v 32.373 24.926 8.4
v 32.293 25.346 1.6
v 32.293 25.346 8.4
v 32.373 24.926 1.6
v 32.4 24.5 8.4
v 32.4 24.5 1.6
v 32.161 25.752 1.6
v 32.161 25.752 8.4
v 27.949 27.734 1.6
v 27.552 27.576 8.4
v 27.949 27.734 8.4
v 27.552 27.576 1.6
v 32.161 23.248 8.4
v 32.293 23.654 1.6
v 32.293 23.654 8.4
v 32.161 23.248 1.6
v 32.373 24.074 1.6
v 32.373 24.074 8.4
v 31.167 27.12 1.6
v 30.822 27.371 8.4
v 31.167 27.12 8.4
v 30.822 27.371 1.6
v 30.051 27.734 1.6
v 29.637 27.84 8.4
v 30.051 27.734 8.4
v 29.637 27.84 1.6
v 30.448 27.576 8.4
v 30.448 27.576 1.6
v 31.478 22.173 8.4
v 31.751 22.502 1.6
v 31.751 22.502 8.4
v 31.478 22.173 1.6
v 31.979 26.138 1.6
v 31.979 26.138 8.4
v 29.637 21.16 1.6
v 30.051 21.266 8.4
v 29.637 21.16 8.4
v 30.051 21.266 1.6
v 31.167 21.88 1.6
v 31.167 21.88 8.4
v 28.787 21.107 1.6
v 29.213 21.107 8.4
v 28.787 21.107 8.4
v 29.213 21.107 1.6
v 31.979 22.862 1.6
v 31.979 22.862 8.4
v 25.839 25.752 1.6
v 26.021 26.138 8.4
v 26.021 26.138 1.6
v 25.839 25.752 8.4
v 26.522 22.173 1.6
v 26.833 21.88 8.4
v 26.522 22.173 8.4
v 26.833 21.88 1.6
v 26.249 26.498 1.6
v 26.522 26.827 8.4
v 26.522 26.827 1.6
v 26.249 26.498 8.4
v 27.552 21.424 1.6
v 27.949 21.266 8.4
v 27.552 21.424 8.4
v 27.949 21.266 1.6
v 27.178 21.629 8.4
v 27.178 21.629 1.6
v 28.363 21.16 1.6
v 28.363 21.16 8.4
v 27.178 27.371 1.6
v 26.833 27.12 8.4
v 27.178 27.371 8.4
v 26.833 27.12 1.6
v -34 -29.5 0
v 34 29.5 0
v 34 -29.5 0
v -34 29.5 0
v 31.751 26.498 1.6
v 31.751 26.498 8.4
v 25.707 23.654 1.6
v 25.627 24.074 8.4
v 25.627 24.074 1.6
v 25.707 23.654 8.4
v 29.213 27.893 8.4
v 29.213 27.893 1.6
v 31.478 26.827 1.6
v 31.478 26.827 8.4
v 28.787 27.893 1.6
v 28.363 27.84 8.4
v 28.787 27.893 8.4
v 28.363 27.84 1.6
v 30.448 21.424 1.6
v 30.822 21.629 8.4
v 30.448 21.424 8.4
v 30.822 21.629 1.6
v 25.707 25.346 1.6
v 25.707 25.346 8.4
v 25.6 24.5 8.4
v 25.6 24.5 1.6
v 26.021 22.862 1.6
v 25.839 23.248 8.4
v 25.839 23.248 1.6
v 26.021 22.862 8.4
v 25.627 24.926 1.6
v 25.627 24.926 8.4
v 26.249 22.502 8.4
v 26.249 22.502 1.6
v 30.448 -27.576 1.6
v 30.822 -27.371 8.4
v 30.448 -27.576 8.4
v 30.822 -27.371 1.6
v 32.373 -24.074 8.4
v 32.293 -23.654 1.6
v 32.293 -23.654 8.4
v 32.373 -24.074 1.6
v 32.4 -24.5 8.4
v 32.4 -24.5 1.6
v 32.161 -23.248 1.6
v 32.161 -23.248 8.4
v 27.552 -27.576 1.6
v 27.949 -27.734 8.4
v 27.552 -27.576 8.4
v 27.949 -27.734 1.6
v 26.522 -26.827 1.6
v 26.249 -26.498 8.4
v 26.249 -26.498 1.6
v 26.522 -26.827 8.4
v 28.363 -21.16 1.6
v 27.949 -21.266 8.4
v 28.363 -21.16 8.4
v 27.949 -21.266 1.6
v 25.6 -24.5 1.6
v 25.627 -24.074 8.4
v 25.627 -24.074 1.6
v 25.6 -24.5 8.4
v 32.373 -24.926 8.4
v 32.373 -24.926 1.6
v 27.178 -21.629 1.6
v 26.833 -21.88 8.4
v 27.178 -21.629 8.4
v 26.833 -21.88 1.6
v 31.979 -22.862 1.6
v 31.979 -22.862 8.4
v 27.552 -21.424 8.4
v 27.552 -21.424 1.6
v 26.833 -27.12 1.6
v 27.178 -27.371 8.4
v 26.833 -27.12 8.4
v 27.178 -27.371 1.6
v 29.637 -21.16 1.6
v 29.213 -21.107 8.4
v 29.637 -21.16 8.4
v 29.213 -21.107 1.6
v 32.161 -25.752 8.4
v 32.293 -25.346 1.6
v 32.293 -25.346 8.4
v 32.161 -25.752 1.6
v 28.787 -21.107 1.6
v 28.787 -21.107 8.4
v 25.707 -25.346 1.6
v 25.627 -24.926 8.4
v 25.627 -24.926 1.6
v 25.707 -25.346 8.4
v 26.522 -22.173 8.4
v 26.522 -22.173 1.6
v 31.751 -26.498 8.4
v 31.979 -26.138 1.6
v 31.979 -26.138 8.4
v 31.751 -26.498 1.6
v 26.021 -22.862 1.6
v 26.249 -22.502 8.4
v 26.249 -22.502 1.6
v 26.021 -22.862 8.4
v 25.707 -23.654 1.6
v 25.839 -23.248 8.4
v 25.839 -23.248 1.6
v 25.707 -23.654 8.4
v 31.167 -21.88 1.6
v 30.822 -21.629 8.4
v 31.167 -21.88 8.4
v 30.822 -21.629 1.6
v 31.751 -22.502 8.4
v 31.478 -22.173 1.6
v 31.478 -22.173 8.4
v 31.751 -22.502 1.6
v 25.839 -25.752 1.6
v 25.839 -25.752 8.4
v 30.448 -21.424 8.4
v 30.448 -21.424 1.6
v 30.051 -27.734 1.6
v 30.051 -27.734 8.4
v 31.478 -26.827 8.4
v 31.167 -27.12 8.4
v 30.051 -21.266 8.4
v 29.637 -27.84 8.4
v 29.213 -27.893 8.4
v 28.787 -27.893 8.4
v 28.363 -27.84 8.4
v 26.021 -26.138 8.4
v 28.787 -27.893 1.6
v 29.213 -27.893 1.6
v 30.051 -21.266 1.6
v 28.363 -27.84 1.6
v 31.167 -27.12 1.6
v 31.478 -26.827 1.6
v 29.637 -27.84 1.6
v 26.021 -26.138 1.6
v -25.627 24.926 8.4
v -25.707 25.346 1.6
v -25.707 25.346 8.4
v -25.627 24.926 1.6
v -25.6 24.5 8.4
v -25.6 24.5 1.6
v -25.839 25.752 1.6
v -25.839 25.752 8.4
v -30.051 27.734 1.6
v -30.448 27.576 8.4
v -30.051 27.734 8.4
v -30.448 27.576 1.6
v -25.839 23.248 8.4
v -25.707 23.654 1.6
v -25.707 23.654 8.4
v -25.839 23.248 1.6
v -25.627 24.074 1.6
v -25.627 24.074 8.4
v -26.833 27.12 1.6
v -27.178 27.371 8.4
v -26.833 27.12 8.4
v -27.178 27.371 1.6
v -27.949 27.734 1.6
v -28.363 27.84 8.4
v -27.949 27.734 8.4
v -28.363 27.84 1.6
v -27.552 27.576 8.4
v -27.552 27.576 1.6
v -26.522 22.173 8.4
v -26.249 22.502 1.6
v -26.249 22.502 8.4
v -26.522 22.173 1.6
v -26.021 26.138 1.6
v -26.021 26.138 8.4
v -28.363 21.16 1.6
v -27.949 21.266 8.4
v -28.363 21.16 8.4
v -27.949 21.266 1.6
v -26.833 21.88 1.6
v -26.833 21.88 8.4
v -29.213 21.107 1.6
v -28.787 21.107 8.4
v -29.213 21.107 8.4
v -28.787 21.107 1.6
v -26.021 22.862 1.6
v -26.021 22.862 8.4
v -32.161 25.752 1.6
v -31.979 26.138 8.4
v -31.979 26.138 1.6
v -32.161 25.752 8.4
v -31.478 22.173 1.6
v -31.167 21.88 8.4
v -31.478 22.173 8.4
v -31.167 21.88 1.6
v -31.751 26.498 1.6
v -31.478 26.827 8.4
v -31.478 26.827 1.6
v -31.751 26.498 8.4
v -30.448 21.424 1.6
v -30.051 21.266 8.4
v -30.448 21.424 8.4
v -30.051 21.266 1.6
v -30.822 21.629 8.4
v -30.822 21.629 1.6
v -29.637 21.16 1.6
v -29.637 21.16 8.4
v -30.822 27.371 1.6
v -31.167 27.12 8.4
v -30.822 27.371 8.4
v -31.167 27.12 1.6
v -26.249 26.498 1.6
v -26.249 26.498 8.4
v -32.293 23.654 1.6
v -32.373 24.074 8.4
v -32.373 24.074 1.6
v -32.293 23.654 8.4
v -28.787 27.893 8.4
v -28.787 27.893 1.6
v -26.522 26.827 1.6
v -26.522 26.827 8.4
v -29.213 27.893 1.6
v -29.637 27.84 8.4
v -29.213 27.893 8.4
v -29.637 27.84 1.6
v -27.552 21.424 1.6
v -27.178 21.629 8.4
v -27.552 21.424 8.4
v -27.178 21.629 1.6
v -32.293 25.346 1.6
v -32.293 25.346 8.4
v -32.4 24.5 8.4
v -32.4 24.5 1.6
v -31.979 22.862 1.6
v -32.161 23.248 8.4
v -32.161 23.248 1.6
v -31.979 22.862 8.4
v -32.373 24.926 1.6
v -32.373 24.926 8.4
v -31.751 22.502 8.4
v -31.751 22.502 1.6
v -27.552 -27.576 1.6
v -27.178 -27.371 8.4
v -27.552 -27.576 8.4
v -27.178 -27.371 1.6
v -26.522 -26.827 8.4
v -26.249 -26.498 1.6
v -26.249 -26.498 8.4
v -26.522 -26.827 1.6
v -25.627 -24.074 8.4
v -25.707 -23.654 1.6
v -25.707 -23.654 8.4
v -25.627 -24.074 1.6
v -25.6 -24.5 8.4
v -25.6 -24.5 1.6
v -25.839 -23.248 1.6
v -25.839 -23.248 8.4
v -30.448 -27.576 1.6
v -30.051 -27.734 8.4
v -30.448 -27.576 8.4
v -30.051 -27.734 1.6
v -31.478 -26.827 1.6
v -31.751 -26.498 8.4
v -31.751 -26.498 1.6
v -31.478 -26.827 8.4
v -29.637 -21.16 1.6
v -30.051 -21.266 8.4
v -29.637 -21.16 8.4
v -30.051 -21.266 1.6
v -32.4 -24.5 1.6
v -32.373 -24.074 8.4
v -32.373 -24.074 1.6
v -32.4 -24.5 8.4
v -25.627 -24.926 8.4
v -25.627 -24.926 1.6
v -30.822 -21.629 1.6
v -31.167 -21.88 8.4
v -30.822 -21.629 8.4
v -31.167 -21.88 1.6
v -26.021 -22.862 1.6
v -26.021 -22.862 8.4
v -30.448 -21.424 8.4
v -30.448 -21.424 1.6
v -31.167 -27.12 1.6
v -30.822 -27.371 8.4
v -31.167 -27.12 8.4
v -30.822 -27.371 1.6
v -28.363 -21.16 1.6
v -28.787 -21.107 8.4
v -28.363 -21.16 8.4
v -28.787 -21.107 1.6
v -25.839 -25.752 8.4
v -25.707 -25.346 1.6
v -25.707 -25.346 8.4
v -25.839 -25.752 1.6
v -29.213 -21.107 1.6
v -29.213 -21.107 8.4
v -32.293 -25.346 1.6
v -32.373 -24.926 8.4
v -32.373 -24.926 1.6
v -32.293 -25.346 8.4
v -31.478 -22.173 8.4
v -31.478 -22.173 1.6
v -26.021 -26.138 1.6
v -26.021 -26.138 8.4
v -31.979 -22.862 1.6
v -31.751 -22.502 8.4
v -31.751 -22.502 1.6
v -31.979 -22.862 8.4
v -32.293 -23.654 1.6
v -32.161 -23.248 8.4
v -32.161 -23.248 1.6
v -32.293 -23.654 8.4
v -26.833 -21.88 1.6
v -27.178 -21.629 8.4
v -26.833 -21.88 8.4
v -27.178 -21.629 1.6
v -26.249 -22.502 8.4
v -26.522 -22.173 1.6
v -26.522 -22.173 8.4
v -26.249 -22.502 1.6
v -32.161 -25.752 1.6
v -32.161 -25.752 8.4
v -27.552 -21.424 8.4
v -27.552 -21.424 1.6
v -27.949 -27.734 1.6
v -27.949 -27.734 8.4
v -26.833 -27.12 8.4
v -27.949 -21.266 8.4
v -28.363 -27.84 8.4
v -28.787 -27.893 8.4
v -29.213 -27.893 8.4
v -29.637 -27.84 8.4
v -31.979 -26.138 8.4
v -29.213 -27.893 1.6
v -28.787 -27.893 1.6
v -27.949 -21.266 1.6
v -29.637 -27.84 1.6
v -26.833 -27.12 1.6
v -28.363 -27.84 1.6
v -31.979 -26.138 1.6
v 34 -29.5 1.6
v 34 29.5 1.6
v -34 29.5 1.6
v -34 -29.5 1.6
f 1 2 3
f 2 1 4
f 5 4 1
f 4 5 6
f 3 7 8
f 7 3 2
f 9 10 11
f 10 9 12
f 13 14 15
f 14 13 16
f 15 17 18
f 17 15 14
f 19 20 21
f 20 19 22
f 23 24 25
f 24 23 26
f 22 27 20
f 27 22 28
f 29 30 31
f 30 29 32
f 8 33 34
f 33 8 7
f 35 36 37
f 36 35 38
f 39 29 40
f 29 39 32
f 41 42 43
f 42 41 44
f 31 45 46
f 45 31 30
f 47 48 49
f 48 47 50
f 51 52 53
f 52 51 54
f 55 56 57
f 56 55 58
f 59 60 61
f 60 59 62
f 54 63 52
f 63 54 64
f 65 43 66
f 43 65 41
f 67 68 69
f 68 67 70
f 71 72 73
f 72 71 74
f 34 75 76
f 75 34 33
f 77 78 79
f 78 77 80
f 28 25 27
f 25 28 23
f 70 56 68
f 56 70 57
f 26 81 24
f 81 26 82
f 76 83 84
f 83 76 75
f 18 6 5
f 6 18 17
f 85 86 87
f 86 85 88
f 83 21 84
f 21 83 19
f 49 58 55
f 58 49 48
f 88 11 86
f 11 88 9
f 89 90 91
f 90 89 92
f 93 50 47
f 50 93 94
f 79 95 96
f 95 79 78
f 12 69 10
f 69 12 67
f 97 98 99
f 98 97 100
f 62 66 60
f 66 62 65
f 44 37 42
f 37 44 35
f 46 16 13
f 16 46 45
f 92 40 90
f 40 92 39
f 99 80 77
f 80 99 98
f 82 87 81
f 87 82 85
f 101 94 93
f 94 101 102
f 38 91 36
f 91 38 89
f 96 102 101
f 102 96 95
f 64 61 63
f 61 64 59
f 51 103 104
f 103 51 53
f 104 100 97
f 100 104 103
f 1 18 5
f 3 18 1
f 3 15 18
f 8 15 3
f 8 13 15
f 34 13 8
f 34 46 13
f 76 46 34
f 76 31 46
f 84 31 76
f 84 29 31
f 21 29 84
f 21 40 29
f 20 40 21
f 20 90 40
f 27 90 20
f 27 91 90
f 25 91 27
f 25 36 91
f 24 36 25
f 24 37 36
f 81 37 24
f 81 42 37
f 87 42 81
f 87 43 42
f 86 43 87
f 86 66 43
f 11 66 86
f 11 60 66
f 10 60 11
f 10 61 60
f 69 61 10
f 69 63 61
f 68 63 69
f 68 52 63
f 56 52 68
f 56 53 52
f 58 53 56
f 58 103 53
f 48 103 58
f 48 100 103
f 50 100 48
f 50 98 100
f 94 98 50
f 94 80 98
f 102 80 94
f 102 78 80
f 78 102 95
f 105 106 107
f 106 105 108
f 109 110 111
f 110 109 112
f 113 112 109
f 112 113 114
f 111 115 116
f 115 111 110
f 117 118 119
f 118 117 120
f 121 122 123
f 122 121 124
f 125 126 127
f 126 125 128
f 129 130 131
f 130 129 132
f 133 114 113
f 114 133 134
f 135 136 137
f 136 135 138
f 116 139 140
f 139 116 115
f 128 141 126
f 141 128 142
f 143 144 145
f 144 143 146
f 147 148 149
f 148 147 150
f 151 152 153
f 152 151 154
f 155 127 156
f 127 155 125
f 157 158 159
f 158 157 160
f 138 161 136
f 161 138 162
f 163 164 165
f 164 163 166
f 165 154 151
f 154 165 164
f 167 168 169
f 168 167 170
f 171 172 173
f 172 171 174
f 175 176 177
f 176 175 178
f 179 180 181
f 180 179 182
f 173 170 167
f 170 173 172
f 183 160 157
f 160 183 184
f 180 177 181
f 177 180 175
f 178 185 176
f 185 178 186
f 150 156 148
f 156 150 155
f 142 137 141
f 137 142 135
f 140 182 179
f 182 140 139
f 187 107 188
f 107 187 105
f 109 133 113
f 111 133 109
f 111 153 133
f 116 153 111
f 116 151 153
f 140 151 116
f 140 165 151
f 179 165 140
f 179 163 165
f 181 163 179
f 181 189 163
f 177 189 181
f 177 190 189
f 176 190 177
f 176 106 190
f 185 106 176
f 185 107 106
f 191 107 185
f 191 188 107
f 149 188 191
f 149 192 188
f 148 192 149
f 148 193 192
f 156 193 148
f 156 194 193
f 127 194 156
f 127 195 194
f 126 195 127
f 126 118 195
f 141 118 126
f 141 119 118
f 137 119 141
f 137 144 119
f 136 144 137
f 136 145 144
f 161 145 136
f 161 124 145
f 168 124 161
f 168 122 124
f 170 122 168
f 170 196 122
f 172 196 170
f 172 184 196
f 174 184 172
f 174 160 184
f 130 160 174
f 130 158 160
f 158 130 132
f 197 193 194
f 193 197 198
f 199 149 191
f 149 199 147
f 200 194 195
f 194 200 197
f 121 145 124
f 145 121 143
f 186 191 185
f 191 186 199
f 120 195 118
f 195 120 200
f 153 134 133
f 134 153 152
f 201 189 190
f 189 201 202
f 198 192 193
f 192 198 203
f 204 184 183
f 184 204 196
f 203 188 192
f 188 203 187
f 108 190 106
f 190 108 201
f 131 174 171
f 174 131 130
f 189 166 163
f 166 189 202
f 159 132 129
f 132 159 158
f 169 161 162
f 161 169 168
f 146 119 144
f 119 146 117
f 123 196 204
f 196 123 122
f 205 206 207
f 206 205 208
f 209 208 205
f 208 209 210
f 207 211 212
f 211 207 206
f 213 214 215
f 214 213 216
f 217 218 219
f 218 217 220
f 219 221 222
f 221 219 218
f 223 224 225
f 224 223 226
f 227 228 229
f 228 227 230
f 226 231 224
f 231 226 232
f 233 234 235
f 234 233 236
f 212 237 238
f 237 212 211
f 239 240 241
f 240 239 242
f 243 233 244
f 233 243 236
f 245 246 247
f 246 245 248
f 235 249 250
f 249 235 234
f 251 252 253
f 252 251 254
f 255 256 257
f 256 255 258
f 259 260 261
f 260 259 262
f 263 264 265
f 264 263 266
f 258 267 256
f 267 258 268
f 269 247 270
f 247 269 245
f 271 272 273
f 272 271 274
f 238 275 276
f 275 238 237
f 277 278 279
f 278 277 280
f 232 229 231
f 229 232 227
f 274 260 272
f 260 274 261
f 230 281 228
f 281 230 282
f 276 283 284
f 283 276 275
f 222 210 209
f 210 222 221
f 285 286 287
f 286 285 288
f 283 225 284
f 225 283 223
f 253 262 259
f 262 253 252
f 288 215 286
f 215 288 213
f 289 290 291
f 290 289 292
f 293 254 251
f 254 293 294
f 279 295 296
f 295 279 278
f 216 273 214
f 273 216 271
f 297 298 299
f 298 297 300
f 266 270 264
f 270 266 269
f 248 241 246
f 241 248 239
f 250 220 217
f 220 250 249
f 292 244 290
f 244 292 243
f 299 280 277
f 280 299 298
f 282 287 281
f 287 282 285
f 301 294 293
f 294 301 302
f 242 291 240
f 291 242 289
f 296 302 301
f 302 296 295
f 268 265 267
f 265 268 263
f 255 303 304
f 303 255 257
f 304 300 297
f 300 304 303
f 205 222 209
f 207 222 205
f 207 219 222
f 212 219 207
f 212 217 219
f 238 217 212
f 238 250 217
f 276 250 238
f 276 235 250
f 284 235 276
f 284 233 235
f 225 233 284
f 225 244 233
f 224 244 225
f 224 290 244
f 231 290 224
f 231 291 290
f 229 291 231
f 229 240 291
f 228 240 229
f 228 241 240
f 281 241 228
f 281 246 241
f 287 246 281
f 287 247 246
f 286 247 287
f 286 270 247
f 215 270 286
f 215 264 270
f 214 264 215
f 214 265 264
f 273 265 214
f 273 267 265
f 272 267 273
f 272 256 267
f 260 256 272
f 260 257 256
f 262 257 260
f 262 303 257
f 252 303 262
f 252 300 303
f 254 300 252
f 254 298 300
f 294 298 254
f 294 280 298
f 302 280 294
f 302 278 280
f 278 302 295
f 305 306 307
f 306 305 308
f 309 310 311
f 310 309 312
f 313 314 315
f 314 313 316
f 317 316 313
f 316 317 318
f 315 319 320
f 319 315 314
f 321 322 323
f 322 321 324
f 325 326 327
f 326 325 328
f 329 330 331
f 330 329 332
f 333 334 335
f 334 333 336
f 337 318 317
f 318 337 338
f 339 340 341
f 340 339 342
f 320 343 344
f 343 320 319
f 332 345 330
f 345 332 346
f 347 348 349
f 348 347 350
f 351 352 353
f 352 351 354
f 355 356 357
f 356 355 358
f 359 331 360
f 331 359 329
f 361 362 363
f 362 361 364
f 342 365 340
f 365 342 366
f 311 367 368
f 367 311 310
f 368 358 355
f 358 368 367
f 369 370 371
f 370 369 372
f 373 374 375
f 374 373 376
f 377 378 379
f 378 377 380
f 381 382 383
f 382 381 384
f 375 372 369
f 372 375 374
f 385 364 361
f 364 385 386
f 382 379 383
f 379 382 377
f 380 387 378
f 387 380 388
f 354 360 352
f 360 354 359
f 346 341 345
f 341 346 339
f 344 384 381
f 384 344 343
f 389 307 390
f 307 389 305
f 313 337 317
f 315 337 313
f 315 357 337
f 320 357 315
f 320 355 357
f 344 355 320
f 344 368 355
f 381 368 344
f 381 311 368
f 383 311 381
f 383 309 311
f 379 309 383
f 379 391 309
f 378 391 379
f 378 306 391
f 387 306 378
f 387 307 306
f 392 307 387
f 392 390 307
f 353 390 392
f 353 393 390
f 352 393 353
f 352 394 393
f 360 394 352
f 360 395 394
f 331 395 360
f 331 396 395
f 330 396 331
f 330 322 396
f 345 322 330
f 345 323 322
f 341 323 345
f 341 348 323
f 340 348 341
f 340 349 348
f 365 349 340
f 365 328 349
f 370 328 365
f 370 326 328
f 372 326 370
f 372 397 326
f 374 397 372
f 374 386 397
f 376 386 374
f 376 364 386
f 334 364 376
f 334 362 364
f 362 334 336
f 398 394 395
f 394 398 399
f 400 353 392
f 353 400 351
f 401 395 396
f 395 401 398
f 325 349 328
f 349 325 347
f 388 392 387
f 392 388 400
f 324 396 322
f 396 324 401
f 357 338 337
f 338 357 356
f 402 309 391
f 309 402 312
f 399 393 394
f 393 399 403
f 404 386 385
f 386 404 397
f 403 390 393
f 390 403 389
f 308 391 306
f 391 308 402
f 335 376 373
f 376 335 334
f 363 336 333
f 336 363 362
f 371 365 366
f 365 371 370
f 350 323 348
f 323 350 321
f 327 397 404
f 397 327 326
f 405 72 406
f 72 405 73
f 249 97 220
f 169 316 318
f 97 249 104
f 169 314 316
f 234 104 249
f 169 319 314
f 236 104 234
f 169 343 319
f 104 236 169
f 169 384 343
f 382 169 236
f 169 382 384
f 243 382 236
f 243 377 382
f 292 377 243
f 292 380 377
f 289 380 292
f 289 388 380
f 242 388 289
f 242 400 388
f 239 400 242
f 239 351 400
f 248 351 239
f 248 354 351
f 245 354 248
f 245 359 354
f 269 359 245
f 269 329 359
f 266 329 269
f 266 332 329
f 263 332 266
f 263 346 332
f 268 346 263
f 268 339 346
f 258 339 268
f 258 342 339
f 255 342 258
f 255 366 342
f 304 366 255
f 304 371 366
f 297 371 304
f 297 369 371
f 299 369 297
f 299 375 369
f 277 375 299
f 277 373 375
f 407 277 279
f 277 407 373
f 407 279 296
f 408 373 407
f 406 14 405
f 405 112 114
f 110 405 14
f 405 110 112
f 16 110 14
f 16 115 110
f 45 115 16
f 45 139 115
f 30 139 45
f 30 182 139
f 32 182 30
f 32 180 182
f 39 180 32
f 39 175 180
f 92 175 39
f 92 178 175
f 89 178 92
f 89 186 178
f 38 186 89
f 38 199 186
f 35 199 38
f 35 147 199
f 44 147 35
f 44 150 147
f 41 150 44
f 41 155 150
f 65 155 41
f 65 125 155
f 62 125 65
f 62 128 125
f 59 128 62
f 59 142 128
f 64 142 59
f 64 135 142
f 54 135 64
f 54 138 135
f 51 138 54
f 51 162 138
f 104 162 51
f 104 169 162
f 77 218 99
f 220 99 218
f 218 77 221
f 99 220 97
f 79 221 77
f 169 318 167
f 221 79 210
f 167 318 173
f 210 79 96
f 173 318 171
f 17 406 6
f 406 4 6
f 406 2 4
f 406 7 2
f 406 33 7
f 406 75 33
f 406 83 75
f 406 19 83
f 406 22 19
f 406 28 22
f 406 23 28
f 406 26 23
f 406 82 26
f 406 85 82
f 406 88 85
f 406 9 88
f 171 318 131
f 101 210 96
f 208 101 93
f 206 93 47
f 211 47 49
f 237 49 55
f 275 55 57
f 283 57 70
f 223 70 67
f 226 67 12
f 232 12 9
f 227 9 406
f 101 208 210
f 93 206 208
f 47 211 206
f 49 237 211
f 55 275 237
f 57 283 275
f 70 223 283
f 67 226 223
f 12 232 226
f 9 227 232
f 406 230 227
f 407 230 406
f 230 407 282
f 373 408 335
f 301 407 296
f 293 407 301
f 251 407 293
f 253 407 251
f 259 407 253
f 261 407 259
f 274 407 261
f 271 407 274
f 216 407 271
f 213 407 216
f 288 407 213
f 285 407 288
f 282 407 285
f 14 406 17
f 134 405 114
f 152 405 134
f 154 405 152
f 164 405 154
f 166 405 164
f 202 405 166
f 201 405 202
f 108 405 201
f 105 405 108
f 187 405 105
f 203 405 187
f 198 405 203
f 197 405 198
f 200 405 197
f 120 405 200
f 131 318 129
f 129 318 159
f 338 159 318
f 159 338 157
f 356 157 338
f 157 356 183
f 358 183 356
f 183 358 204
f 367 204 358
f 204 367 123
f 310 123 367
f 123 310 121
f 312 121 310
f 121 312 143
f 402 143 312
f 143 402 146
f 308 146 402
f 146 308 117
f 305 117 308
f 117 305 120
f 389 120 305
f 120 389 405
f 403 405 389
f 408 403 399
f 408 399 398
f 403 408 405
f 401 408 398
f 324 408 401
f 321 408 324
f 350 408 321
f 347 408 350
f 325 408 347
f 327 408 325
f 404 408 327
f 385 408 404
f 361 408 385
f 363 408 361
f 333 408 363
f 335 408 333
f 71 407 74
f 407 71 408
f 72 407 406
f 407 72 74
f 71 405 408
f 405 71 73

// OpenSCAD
// file: configuration/general.scad
//Screw standards
SCREW_STANDARD_M3=3;

//HDMI screen cover
HDMI_HOLES_LENGTH=157;
HDMI_HOLES_WIDTH=108;
GAP_MAINSCREWS_HDMI=3;
BASE_OUTERPAD_HDMI=2;
FRONT_COVER_TRAPS_TOLERANCE=0.1;


//Back plate
BACK_PLATE_CENTER_BLOB=6;
BACK_PLATE_WALL=3;
BACK_PLATE_THICKNESS=10;
SCREW_BLOCK_SIZE=12;

BACK_PLATE_ADAPTER0_THICKNESS=1;
BACK_PLATE_ADAPTER0_SPACING=100;
BACK_PLATE_SENSORBOARD_X=40;
BACK_PLATE_SENSORBOARD_Y=10;
BACK_PLATE_RPI_BOARD_X=-50;
BACK_PLATE_RPI_BOARD_Y=10;

//Adapter0
CIRCUIT_BOARD_SCREWSTANDARD0=2;
CIRCUIT_BOARD_ADAPTER0_SPACING=10;
CIRCUIT_BOARD_ADAPTER0_SCREW_HEIGHT=6-BACK_PLATE_THICKNESS;
CIRCUIT_BOARD_ADAPTER0_SCREW_TRAP_HEIGHT=1.6;
CIRCUIT_BOARD_ADAPTER0_PLUS_WIDTH=5;
CIRCUIT_BOARD_ADAPTER0_BASE_WIDTH=CIRCUIT_BOARD_ADAPTER0_SPACING+10;
// file: utils/hex_trap.scad
module hex_hole(h_trap,h_hole,r_trap,r_hole,rot)
{
    rotate([rot,0,0]) {
translate([0,0,h_hole])
{
	cylinder(h = h_trap, r = r_trap, $fn = 6);
}

	cylinder(h = h_hole, r = r_hole, $fn = 20);

}
}
/*
width=18;
length=60;
h_hole=2;
h_trap=4;
r_trap=3;
r_hole=2;
spacer=4;
explode=false;
if (explode)
{
cube(size = [width,length,h_hole+h_trap], center = false);
translate([0,0,10]){
hex_hole(h_trap,h_hole,r_trap,r_hole,width/2,4,0);
hex_hole(h_trap,h_hole,r_trap+1,r_hole,width/2,12,0);
hex_hole(h_trap,h_hole,r_trap+2,r_hole,width/2,22,0);
hex_hole(h_trap,h_hole,r_trap+3,r_hole,width/2,33,0);}
}
else
{
difference() {
cube(size = [width,length,h_hole+h_trap], center = false);
hex_hole(h_trap,h_hole,r_trap-0.5,r_hole,width/2,5,0);
hex_hole(h_trap,h_hole,r_trap,r_hole,width/2,13,0);
hex_hole(h_trap,h_hole,r_trap+1,r_hole,width/2,23,0);
hex_hole(h_trap,h_hole,r_trap+2,r_hole,width/2,36,0);
hex_hole(h_trap,h_hole,r_trap+3,r_hole,width/2,50,0);
}
}

*/
// file: utils/circuit_plate.scad
include <hex_trap.scad>;
include <../configuration/general.scad>;


module traps(base_height,base_hole_height,offset_x,with_adapter)
{
translate([base_length/2,base_width/2,base_height])
hex_hole(base_trap_height+0.1,base_hole_height,CIRCUIT_BOARD_SCREWSTANDARD0,180);
translate([base_length/2,-base_width/2,base_height])
hex_hole(base_trap_height+0.1,base_hole_height,CIRCUIT_BOARD_SCREWSTANDARD0,180);
translate([-base_length/2,base_width/2,base_height])
hex_hole(base_trap_height+0.1,base_hole_height,CIRCUIT_BOARD_SCREWSTANDARD0,180);
translate([-base_length/2,-base_width/2,base_height])
hex_hole(base_trap_height+0.1,base_hole_height,CIRCUIT_BOARD_SCREWSTANDARD0,180);
    if (with_adapter){
    translate([offset_x,0,0]){
translate([CIRCUIT_BOARD_ADAPTER0_SPACING/2,CIRCUIT_BOARD_ADAPTER0_SPACING/2,0])
hex_hole(CIRCUIT_BOARD_ADAPTER0_SCREW_TRAP_HEIGHT,CIRCUIT_BOARD_ADAPTER0_SCREW_HEIGHT - CIRCUIT_BOARD_ADAPTER0_SCREW_TRAP_HEIGHT,CIRCUIT_BOARD_SCREWSTANDARD0,0);
translate([CIRCUIT_BOARD_ADAPTER0_SPACING/2,-CIRCUIT_BOARD_ADAPTER0_SPACING/2,0])
hex_hole(CIRCUIT_BOARD_ADAPTER0_SCREW_TRAP_HEIGHT,CIRCUIT_BOARD_ADAPTER0_SCREW_HEIGHT - CIRCUIT_BOARD_ADAPTER0_SCREW_TRAP_HEIGHT,CIRCUIT_BOARD_SCREWSTANDARD0,0);
translate([-CIRCUIT_BOARD_ADAPTER0_SPACING/2,CIRCUIT_BOARD_ADAPTER0_SPACING/2,0])
hex_hole(CIRCUIT_BOARD_ADAPTER0_SCREW_TRAP_HEIGHT,CIRCUIT_BOARD_ADAPTER0_SCREW_HEIGHT - CIRCUIT_BOARD_ADAPTER0_SCREW_TRAP_HEIGHT,CIRCUIT_BOARD_SCREWSTANDARD0,0);
translate([-CIRCUIT_BOARD_ADAPTER0_SPACING/2,-CIRCUIT_BOARD_ADAPTER0_SPACING/2,0])
hex_hole(CIRCUIT_BOARD_ADAPTER0_SCREW_TRAP_HEIGHT,CIRCUIT_BOARD_ADAPTER0_SCREW_HEIGHT - CIRCUIT_BOARD_ADAPTER0_SCREW_TRAP_HEIGHT,CIRCUIT_BOARD_SCREWSTANDARD0,0);}
}
}
module pillars(base_height,offset_x,with_adapter)
{
    translate([base_length/2,base_width/2,0])
cylinder(r=CIRCUIT_BOARD_SCREWSTANDARD0*1.7,h=base_height,$fn=50);
    translate([base_length/2,-base_width/2,0])
cylinder(r=CIRCUIT_BOARD_SCREWSTANDARD0*1.7,h=base_height,$fn=50);
    translate([-base_length/2,base_width/2,0])
cylinder(r=CIRCUIT_BOARD_SCREWSTANDARD0*1.7,h=base_height,$fn=50);
    translate([-base_length/2,-base_width/2,0])
cylinder(r=CIRCUIT_BOARD_SCREWSTANDARD0*1.7,h=base_height,$fn=50);
    if (with_adapter){
    translate([offset_x,0,0]){
    translate([CIRCUIT_BOARD_ADAPTER0_SPACING/2,CIRCUIT_BOARD_ADAPTER0_SPACING/2,0])
cylinder(r=CIRCUIT_BOARD_SCREWSTANDARD0*1.7,h=CIRCUIT_BOARD_ADAPTER0_SCREW_HEIGHT,$fn=50);
    translate([CIRCUIT_BOARD_ADAPTER0_SPACING/2,-CIRCUIT_BOARD_ADAPTER0_SPACING/2,0])
cylinder(r=CIRCUIT_BOARD_SCREWSTANDARD0*1.7,h=CIRCUIT_BOARD_ADAPTER0_SCREW_HEIGHT,$fn=50);
    translate([-CIRCUIT_BOARD_ADAPTER0_SPACING/2,CIRCUIT_BOARD_ADAPTER0_SPACING/2,0])
cylinder(r=CIRCUIT_BOARD_SCREWSTANDARD0*1.7,h=CIRCUIT_BOARD_ADAPTER0_SCREW_HEIGHT,$fn=50);
    translate([-CIRCUIT_BOARD_ADAPTER0_SPACING/2,-CIRCUIT_BOARD_ADAPTER0_SPACING/2,0])
cylinder(r=CIRCUIT_BOARD_SCREWSTANDARD0*1.7,h=CIRCUIT_BOARD_ADAPTER0_SCREW_HEIGHT,$fn=50);
    }}
}
module box()
{
    
    translate([-base_length/2-base_padding,-base_width/2-base_padding,0])
    cube(size=[base_length+base_padding*2,base_width+base_padding*2,base_trap_height],center=false);
}
module extrusions(offset_x)
{

    difference(){
        translate([-base_length/2+base_padding,-base_width/2+base_padding,0])
        cube(size=[base_length-base_padding*2,base_width-base_padding*2,base_trap_height],center=false);
        union(){
            translate([-CIRCUIT_BOARD_ADAPTER0_SPACING/2-base_padding+offset_x,-CIRCUIT_BOARD_ADAPTER0_SPACING/2-base_padding,0])
            cube(size=[CIRCUIT_BOARD_ADAPTER0_SPACING+base_padding*2,CIRCUIT_BOARD_ADAPTER0_SPACING+base_padding*2,base_trap_height],center=false);
            translate([-base_length/2-base_padding,-CIRCUIT_BOARD_ADAPTER0_PLUS_WIDTH/2,0])
            cube(size=[base_length+base_padding*2,CIRCUIT_BOARD_ADAPTER0_PLUS_WIDTH,base_trap_height],center=false);
            translate([-base_length/2-base_padding,-CIRCUIT_BOARD_ADAPTER0_PLUS_WIDTH/2,0])
            cube(size=[base_length+base_padding*2,CIRCUIT_BOARD_ADAPTER0_PLUS_WIDTH,base_trap_height],center=false);
            translate([-CIRCUIT_BOARD_ADAPTER0_PLUS_WIDTH/2+offset_x,-base_width/2-base_padding,0])
            cube(size=[CIRCUIT_BOARD_ADAPTER0_PLUS_WIDTH,base_width+base_padding*2,base_trap_height],center=false);
        }
    }
}
module circuit_plate_basic(base_length,base_width,base_padding,pcb_thickness,base_trap_height,screw_height)
{
circuit_plate_offset_adapter(base_length,base_width,base_padding,pcb_thickness,base_trap_height,screw_height,0,0,with_adapter=0);
}
module circuit_plate(base_length,base_width,base_padding,pcb_thickness,base_trap_height,screw_height)
{
circuit_plate_offset_adapter(base_length,base_width,base_padding,pcb_thickness,base_trap_height,screw_height,0,0,with_adapter=1);
}
module circuit_plate_offset_adapter(base_length,base_width,base_padding,pcb_thickness,base_trap_height,screw_height,offset_x,offset_y,with_adapter)
{
base_height=screw_height-pcb_thickness;    
base_hole_height=base_height-base_trap_height;

difference(){
    union(){
        box();
        pillars(base_height,offset_x,with_adapter=with_adapter);
        }
    union(){    
        if (with_adapter){
        extrusions(offset_x);
        }
        traps(base_height,base_hole_height,offset_x,with_adapter=with_adapter);
    }
}
}
// main file
include <utils/circuit_plate.scad>;
base_length=58;
base_width=49;
base_padding=5;
pcb_thickness=1.6;
screw_height=10;
base_trap_height=1.6;
circuit_plate_basic(base_length,base_width,base_padding,pcb_thickness,base_trap_height,screw_height,with_adapter=0);
